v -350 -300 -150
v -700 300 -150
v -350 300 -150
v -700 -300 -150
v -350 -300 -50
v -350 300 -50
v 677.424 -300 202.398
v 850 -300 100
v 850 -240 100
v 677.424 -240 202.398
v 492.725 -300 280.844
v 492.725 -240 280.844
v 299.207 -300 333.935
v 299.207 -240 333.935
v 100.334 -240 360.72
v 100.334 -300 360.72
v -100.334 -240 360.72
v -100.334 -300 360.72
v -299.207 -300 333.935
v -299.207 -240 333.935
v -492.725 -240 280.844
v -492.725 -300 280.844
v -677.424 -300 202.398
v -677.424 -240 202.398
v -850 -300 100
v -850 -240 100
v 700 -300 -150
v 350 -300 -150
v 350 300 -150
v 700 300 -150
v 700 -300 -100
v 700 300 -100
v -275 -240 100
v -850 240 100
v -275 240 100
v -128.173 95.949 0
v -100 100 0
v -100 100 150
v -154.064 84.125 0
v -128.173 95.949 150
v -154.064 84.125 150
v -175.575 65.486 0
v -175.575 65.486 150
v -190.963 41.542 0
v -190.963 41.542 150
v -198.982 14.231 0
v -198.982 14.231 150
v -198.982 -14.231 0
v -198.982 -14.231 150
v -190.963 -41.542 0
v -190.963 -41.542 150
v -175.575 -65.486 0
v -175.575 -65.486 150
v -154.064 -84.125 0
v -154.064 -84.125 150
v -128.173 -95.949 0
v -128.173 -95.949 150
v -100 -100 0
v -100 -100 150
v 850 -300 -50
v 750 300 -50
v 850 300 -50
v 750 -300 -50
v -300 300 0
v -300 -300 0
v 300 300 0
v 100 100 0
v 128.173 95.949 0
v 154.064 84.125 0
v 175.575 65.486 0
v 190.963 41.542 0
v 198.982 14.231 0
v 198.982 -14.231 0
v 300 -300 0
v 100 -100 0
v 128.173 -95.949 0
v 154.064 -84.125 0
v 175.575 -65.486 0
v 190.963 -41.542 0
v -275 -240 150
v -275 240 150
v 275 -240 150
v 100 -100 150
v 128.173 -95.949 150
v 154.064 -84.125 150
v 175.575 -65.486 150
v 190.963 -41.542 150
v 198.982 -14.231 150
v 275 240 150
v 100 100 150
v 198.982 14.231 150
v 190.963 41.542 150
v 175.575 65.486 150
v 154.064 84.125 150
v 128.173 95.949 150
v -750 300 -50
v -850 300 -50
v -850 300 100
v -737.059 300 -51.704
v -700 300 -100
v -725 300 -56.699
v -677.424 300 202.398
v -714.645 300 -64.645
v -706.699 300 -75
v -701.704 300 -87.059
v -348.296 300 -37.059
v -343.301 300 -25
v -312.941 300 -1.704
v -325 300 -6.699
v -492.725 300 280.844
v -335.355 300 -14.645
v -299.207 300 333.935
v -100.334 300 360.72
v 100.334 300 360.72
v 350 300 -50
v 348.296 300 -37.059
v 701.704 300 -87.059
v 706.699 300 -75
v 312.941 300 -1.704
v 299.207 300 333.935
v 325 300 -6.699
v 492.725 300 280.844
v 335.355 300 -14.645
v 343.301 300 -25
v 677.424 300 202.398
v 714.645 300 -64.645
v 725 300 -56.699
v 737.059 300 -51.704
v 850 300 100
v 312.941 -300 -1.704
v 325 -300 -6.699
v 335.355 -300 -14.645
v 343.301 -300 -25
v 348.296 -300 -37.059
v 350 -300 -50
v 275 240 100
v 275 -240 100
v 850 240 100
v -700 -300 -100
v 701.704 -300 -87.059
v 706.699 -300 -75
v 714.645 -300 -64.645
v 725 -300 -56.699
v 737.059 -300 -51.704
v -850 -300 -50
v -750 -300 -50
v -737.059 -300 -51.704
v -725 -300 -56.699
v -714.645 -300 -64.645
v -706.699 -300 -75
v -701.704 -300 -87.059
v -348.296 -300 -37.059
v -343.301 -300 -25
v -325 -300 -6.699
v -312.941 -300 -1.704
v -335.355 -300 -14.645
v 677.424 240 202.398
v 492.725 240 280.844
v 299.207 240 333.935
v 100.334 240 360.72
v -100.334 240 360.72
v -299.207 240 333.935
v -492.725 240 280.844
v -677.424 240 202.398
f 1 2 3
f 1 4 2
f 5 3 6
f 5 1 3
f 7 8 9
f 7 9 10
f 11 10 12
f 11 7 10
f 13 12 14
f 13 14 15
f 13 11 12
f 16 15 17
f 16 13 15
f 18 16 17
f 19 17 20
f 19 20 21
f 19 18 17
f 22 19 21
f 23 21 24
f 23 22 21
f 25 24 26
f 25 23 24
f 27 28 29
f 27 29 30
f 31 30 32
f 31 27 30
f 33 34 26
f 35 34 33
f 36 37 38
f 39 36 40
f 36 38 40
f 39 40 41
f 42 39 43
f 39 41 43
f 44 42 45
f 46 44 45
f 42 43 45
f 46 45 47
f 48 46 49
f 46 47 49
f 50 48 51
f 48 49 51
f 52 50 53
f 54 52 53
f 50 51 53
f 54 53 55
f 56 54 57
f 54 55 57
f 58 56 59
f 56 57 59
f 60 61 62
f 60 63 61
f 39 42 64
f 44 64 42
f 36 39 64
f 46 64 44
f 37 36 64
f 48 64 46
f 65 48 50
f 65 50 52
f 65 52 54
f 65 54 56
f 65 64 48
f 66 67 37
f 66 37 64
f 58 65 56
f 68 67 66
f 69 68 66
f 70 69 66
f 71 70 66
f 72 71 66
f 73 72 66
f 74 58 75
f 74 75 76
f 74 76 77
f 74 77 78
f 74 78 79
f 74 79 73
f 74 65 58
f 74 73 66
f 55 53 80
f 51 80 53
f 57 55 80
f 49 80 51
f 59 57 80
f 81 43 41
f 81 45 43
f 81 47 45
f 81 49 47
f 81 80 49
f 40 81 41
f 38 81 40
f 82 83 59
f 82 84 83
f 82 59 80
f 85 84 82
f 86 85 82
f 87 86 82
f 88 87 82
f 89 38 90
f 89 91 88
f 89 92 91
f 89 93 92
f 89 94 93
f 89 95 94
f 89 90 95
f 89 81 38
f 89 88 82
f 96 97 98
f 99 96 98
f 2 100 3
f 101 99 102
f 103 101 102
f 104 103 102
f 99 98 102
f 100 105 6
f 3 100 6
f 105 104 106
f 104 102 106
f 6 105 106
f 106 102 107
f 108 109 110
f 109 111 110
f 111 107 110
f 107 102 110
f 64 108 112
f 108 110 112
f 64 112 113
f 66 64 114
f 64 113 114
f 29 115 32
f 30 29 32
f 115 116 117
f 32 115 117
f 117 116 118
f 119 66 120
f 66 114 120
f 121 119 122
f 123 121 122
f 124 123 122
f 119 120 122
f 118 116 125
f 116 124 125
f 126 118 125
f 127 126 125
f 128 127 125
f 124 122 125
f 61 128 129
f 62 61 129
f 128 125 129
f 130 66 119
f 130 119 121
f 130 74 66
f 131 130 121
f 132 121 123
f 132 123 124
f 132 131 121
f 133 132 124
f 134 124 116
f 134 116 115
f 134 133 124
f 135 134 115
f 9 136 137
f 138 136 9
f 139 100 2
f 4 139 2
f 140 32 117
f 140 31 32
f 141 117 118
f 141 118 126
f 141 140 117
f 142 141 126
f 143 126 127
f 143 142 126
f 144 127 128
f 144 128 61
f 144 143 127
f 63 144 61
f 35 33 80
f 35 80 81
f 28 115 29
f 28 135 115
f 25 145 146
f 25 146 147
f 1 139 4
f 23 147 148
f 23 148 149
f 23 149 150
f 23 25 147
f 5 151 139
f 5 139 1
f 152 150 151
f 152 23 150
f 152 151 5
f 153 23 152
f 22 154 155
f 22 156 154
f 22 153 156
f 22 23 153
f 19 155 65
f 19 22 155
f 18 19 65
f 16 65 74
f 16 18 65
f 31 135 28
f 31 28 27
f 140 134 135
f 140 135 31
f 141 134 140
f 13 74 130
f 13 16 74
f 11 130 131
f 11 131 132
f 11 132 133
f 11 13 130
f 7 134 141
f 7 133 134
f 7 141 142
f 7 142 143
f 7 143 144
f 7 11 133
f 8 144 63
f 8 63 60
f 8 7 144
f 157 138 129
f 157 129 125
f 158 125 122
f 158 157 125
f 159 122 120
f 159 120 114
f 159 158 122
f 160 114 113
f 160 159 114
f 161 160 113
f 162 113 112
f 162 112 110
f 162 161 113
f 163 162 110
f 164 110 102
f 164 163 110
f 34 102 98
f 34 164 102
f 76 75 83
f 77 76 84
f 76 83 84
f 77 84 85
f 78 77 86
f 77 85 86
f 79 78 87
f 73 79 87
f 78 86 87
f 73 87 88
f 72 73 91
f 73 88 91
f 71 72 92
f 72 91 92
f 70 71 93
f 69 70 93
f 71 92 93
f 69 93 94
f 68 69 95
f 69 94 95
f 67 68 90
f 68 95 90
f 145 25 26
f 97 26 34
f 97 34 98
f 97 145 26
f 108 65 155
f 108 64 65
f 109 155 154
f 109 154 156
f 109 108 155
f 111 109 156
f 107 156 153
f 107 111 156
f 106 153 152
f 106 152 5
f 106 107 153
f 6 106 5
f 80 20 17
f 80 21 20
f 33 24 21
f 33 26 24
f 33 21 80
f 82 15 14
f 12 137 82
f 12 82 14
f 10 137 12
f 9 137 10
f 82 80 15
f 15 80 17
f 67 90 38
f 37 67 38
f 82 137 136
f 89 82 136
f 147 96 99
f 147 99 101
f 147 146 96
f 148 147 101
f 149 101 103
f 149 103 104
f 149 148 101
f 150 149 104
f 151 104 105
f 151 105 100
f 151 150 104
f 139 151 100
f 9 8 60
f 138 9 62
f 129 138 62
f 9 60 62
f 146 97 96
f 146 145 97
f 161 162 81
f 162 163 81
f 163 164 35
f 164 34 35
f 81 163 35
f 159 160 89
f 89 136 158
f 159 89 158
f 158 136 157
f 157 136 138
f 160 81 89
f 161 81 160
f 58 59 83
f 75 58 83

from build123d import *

# Parameters (mm, degrees)
F1_DEPTH = 300
F2_W     = 1700
F2_H     = 480
F3_DEPTH = 364.080291
F4_W     = 1700
F4_H     = 480
F5_DEPTH = 100
F6_W     = 550
F6_H     = 480
F7_DEPTH = 50
F9_DEPTH = 300.001
F10_R    = 50


with BuildPart() as f1:
    # F0 (on Front) → F1 (new body, symmetric)
    with BuildSketch(Plane.XZ):
        with BuildLine():
            Line((-350, 0), (0, 0))
            Line((0, 0), (350, 0))
            Line((350, 0), (350, -150))
            Line((350, -150), (700, -150))
            Line((700, -150), (700, -50))
            Line((700, -50), (850, -50))
            Line((850, -50), (850, 100))
            ThreePointArc((850, 100), (0, 364.079291), (-850, 100))
            Line((-850, 100), (-850, -50))
            Line((-850, -50), (-700, -50))
            Line((-700, -50), (-700, -150))
            Line((-700, -150), (-350, -150))
            Line((-350, -150), (-350, 0))
        make_face()
    extrude(amount=F1_DEPTH, both=True)

    # F2 (on Top) → F3 (cut, through all)
    with BuildSketch(Plane.XY):
        Rectangle(F2_W, F2_H)
    extrude(amount=F3_DEPTH, mode=Mode.SUBTRACT)

    # F4 (on face) → F5 (join)
    with BuildSketch(Plane.XY):
        Rectangle(F4_W, F4_H)
    extrude(amount=F5_DEPTH)

    # F6 (on face) → F7 (join)
    with BuildSketch(Plane.XY.offset(100)):
        Rectangle(F6_W, F6_H)
    extrude(amount=F7_DEPTH)

    # F8 (on face) → F9 (cut, through all)
    with BuildSketch(Plane.XY.offset(150)):
        with BuildLine():
            Line((-100, -100), (100, -100))
            ThreePointArc((100, -100), (200, 0), (100, 100))
            Line((100, 100), (-100, 100))
            ThreePointArc((-100, 100), (-200, 0), (-100, -100))
        make_face()
    extrude(amount=-F9_DEPTH, mode=Mode.SUBTRACT)

    # F10
    f10_edges = [f1.edges().sort_by_distance(p)[0] for p in [
        (-350, 0, 0),
        (350, 0, 0),
        (-700, 0, -50),
        (700, 0, -50),
    ]]
    fillet(f10_edges, radius=F10_R)


solid = f1.part
